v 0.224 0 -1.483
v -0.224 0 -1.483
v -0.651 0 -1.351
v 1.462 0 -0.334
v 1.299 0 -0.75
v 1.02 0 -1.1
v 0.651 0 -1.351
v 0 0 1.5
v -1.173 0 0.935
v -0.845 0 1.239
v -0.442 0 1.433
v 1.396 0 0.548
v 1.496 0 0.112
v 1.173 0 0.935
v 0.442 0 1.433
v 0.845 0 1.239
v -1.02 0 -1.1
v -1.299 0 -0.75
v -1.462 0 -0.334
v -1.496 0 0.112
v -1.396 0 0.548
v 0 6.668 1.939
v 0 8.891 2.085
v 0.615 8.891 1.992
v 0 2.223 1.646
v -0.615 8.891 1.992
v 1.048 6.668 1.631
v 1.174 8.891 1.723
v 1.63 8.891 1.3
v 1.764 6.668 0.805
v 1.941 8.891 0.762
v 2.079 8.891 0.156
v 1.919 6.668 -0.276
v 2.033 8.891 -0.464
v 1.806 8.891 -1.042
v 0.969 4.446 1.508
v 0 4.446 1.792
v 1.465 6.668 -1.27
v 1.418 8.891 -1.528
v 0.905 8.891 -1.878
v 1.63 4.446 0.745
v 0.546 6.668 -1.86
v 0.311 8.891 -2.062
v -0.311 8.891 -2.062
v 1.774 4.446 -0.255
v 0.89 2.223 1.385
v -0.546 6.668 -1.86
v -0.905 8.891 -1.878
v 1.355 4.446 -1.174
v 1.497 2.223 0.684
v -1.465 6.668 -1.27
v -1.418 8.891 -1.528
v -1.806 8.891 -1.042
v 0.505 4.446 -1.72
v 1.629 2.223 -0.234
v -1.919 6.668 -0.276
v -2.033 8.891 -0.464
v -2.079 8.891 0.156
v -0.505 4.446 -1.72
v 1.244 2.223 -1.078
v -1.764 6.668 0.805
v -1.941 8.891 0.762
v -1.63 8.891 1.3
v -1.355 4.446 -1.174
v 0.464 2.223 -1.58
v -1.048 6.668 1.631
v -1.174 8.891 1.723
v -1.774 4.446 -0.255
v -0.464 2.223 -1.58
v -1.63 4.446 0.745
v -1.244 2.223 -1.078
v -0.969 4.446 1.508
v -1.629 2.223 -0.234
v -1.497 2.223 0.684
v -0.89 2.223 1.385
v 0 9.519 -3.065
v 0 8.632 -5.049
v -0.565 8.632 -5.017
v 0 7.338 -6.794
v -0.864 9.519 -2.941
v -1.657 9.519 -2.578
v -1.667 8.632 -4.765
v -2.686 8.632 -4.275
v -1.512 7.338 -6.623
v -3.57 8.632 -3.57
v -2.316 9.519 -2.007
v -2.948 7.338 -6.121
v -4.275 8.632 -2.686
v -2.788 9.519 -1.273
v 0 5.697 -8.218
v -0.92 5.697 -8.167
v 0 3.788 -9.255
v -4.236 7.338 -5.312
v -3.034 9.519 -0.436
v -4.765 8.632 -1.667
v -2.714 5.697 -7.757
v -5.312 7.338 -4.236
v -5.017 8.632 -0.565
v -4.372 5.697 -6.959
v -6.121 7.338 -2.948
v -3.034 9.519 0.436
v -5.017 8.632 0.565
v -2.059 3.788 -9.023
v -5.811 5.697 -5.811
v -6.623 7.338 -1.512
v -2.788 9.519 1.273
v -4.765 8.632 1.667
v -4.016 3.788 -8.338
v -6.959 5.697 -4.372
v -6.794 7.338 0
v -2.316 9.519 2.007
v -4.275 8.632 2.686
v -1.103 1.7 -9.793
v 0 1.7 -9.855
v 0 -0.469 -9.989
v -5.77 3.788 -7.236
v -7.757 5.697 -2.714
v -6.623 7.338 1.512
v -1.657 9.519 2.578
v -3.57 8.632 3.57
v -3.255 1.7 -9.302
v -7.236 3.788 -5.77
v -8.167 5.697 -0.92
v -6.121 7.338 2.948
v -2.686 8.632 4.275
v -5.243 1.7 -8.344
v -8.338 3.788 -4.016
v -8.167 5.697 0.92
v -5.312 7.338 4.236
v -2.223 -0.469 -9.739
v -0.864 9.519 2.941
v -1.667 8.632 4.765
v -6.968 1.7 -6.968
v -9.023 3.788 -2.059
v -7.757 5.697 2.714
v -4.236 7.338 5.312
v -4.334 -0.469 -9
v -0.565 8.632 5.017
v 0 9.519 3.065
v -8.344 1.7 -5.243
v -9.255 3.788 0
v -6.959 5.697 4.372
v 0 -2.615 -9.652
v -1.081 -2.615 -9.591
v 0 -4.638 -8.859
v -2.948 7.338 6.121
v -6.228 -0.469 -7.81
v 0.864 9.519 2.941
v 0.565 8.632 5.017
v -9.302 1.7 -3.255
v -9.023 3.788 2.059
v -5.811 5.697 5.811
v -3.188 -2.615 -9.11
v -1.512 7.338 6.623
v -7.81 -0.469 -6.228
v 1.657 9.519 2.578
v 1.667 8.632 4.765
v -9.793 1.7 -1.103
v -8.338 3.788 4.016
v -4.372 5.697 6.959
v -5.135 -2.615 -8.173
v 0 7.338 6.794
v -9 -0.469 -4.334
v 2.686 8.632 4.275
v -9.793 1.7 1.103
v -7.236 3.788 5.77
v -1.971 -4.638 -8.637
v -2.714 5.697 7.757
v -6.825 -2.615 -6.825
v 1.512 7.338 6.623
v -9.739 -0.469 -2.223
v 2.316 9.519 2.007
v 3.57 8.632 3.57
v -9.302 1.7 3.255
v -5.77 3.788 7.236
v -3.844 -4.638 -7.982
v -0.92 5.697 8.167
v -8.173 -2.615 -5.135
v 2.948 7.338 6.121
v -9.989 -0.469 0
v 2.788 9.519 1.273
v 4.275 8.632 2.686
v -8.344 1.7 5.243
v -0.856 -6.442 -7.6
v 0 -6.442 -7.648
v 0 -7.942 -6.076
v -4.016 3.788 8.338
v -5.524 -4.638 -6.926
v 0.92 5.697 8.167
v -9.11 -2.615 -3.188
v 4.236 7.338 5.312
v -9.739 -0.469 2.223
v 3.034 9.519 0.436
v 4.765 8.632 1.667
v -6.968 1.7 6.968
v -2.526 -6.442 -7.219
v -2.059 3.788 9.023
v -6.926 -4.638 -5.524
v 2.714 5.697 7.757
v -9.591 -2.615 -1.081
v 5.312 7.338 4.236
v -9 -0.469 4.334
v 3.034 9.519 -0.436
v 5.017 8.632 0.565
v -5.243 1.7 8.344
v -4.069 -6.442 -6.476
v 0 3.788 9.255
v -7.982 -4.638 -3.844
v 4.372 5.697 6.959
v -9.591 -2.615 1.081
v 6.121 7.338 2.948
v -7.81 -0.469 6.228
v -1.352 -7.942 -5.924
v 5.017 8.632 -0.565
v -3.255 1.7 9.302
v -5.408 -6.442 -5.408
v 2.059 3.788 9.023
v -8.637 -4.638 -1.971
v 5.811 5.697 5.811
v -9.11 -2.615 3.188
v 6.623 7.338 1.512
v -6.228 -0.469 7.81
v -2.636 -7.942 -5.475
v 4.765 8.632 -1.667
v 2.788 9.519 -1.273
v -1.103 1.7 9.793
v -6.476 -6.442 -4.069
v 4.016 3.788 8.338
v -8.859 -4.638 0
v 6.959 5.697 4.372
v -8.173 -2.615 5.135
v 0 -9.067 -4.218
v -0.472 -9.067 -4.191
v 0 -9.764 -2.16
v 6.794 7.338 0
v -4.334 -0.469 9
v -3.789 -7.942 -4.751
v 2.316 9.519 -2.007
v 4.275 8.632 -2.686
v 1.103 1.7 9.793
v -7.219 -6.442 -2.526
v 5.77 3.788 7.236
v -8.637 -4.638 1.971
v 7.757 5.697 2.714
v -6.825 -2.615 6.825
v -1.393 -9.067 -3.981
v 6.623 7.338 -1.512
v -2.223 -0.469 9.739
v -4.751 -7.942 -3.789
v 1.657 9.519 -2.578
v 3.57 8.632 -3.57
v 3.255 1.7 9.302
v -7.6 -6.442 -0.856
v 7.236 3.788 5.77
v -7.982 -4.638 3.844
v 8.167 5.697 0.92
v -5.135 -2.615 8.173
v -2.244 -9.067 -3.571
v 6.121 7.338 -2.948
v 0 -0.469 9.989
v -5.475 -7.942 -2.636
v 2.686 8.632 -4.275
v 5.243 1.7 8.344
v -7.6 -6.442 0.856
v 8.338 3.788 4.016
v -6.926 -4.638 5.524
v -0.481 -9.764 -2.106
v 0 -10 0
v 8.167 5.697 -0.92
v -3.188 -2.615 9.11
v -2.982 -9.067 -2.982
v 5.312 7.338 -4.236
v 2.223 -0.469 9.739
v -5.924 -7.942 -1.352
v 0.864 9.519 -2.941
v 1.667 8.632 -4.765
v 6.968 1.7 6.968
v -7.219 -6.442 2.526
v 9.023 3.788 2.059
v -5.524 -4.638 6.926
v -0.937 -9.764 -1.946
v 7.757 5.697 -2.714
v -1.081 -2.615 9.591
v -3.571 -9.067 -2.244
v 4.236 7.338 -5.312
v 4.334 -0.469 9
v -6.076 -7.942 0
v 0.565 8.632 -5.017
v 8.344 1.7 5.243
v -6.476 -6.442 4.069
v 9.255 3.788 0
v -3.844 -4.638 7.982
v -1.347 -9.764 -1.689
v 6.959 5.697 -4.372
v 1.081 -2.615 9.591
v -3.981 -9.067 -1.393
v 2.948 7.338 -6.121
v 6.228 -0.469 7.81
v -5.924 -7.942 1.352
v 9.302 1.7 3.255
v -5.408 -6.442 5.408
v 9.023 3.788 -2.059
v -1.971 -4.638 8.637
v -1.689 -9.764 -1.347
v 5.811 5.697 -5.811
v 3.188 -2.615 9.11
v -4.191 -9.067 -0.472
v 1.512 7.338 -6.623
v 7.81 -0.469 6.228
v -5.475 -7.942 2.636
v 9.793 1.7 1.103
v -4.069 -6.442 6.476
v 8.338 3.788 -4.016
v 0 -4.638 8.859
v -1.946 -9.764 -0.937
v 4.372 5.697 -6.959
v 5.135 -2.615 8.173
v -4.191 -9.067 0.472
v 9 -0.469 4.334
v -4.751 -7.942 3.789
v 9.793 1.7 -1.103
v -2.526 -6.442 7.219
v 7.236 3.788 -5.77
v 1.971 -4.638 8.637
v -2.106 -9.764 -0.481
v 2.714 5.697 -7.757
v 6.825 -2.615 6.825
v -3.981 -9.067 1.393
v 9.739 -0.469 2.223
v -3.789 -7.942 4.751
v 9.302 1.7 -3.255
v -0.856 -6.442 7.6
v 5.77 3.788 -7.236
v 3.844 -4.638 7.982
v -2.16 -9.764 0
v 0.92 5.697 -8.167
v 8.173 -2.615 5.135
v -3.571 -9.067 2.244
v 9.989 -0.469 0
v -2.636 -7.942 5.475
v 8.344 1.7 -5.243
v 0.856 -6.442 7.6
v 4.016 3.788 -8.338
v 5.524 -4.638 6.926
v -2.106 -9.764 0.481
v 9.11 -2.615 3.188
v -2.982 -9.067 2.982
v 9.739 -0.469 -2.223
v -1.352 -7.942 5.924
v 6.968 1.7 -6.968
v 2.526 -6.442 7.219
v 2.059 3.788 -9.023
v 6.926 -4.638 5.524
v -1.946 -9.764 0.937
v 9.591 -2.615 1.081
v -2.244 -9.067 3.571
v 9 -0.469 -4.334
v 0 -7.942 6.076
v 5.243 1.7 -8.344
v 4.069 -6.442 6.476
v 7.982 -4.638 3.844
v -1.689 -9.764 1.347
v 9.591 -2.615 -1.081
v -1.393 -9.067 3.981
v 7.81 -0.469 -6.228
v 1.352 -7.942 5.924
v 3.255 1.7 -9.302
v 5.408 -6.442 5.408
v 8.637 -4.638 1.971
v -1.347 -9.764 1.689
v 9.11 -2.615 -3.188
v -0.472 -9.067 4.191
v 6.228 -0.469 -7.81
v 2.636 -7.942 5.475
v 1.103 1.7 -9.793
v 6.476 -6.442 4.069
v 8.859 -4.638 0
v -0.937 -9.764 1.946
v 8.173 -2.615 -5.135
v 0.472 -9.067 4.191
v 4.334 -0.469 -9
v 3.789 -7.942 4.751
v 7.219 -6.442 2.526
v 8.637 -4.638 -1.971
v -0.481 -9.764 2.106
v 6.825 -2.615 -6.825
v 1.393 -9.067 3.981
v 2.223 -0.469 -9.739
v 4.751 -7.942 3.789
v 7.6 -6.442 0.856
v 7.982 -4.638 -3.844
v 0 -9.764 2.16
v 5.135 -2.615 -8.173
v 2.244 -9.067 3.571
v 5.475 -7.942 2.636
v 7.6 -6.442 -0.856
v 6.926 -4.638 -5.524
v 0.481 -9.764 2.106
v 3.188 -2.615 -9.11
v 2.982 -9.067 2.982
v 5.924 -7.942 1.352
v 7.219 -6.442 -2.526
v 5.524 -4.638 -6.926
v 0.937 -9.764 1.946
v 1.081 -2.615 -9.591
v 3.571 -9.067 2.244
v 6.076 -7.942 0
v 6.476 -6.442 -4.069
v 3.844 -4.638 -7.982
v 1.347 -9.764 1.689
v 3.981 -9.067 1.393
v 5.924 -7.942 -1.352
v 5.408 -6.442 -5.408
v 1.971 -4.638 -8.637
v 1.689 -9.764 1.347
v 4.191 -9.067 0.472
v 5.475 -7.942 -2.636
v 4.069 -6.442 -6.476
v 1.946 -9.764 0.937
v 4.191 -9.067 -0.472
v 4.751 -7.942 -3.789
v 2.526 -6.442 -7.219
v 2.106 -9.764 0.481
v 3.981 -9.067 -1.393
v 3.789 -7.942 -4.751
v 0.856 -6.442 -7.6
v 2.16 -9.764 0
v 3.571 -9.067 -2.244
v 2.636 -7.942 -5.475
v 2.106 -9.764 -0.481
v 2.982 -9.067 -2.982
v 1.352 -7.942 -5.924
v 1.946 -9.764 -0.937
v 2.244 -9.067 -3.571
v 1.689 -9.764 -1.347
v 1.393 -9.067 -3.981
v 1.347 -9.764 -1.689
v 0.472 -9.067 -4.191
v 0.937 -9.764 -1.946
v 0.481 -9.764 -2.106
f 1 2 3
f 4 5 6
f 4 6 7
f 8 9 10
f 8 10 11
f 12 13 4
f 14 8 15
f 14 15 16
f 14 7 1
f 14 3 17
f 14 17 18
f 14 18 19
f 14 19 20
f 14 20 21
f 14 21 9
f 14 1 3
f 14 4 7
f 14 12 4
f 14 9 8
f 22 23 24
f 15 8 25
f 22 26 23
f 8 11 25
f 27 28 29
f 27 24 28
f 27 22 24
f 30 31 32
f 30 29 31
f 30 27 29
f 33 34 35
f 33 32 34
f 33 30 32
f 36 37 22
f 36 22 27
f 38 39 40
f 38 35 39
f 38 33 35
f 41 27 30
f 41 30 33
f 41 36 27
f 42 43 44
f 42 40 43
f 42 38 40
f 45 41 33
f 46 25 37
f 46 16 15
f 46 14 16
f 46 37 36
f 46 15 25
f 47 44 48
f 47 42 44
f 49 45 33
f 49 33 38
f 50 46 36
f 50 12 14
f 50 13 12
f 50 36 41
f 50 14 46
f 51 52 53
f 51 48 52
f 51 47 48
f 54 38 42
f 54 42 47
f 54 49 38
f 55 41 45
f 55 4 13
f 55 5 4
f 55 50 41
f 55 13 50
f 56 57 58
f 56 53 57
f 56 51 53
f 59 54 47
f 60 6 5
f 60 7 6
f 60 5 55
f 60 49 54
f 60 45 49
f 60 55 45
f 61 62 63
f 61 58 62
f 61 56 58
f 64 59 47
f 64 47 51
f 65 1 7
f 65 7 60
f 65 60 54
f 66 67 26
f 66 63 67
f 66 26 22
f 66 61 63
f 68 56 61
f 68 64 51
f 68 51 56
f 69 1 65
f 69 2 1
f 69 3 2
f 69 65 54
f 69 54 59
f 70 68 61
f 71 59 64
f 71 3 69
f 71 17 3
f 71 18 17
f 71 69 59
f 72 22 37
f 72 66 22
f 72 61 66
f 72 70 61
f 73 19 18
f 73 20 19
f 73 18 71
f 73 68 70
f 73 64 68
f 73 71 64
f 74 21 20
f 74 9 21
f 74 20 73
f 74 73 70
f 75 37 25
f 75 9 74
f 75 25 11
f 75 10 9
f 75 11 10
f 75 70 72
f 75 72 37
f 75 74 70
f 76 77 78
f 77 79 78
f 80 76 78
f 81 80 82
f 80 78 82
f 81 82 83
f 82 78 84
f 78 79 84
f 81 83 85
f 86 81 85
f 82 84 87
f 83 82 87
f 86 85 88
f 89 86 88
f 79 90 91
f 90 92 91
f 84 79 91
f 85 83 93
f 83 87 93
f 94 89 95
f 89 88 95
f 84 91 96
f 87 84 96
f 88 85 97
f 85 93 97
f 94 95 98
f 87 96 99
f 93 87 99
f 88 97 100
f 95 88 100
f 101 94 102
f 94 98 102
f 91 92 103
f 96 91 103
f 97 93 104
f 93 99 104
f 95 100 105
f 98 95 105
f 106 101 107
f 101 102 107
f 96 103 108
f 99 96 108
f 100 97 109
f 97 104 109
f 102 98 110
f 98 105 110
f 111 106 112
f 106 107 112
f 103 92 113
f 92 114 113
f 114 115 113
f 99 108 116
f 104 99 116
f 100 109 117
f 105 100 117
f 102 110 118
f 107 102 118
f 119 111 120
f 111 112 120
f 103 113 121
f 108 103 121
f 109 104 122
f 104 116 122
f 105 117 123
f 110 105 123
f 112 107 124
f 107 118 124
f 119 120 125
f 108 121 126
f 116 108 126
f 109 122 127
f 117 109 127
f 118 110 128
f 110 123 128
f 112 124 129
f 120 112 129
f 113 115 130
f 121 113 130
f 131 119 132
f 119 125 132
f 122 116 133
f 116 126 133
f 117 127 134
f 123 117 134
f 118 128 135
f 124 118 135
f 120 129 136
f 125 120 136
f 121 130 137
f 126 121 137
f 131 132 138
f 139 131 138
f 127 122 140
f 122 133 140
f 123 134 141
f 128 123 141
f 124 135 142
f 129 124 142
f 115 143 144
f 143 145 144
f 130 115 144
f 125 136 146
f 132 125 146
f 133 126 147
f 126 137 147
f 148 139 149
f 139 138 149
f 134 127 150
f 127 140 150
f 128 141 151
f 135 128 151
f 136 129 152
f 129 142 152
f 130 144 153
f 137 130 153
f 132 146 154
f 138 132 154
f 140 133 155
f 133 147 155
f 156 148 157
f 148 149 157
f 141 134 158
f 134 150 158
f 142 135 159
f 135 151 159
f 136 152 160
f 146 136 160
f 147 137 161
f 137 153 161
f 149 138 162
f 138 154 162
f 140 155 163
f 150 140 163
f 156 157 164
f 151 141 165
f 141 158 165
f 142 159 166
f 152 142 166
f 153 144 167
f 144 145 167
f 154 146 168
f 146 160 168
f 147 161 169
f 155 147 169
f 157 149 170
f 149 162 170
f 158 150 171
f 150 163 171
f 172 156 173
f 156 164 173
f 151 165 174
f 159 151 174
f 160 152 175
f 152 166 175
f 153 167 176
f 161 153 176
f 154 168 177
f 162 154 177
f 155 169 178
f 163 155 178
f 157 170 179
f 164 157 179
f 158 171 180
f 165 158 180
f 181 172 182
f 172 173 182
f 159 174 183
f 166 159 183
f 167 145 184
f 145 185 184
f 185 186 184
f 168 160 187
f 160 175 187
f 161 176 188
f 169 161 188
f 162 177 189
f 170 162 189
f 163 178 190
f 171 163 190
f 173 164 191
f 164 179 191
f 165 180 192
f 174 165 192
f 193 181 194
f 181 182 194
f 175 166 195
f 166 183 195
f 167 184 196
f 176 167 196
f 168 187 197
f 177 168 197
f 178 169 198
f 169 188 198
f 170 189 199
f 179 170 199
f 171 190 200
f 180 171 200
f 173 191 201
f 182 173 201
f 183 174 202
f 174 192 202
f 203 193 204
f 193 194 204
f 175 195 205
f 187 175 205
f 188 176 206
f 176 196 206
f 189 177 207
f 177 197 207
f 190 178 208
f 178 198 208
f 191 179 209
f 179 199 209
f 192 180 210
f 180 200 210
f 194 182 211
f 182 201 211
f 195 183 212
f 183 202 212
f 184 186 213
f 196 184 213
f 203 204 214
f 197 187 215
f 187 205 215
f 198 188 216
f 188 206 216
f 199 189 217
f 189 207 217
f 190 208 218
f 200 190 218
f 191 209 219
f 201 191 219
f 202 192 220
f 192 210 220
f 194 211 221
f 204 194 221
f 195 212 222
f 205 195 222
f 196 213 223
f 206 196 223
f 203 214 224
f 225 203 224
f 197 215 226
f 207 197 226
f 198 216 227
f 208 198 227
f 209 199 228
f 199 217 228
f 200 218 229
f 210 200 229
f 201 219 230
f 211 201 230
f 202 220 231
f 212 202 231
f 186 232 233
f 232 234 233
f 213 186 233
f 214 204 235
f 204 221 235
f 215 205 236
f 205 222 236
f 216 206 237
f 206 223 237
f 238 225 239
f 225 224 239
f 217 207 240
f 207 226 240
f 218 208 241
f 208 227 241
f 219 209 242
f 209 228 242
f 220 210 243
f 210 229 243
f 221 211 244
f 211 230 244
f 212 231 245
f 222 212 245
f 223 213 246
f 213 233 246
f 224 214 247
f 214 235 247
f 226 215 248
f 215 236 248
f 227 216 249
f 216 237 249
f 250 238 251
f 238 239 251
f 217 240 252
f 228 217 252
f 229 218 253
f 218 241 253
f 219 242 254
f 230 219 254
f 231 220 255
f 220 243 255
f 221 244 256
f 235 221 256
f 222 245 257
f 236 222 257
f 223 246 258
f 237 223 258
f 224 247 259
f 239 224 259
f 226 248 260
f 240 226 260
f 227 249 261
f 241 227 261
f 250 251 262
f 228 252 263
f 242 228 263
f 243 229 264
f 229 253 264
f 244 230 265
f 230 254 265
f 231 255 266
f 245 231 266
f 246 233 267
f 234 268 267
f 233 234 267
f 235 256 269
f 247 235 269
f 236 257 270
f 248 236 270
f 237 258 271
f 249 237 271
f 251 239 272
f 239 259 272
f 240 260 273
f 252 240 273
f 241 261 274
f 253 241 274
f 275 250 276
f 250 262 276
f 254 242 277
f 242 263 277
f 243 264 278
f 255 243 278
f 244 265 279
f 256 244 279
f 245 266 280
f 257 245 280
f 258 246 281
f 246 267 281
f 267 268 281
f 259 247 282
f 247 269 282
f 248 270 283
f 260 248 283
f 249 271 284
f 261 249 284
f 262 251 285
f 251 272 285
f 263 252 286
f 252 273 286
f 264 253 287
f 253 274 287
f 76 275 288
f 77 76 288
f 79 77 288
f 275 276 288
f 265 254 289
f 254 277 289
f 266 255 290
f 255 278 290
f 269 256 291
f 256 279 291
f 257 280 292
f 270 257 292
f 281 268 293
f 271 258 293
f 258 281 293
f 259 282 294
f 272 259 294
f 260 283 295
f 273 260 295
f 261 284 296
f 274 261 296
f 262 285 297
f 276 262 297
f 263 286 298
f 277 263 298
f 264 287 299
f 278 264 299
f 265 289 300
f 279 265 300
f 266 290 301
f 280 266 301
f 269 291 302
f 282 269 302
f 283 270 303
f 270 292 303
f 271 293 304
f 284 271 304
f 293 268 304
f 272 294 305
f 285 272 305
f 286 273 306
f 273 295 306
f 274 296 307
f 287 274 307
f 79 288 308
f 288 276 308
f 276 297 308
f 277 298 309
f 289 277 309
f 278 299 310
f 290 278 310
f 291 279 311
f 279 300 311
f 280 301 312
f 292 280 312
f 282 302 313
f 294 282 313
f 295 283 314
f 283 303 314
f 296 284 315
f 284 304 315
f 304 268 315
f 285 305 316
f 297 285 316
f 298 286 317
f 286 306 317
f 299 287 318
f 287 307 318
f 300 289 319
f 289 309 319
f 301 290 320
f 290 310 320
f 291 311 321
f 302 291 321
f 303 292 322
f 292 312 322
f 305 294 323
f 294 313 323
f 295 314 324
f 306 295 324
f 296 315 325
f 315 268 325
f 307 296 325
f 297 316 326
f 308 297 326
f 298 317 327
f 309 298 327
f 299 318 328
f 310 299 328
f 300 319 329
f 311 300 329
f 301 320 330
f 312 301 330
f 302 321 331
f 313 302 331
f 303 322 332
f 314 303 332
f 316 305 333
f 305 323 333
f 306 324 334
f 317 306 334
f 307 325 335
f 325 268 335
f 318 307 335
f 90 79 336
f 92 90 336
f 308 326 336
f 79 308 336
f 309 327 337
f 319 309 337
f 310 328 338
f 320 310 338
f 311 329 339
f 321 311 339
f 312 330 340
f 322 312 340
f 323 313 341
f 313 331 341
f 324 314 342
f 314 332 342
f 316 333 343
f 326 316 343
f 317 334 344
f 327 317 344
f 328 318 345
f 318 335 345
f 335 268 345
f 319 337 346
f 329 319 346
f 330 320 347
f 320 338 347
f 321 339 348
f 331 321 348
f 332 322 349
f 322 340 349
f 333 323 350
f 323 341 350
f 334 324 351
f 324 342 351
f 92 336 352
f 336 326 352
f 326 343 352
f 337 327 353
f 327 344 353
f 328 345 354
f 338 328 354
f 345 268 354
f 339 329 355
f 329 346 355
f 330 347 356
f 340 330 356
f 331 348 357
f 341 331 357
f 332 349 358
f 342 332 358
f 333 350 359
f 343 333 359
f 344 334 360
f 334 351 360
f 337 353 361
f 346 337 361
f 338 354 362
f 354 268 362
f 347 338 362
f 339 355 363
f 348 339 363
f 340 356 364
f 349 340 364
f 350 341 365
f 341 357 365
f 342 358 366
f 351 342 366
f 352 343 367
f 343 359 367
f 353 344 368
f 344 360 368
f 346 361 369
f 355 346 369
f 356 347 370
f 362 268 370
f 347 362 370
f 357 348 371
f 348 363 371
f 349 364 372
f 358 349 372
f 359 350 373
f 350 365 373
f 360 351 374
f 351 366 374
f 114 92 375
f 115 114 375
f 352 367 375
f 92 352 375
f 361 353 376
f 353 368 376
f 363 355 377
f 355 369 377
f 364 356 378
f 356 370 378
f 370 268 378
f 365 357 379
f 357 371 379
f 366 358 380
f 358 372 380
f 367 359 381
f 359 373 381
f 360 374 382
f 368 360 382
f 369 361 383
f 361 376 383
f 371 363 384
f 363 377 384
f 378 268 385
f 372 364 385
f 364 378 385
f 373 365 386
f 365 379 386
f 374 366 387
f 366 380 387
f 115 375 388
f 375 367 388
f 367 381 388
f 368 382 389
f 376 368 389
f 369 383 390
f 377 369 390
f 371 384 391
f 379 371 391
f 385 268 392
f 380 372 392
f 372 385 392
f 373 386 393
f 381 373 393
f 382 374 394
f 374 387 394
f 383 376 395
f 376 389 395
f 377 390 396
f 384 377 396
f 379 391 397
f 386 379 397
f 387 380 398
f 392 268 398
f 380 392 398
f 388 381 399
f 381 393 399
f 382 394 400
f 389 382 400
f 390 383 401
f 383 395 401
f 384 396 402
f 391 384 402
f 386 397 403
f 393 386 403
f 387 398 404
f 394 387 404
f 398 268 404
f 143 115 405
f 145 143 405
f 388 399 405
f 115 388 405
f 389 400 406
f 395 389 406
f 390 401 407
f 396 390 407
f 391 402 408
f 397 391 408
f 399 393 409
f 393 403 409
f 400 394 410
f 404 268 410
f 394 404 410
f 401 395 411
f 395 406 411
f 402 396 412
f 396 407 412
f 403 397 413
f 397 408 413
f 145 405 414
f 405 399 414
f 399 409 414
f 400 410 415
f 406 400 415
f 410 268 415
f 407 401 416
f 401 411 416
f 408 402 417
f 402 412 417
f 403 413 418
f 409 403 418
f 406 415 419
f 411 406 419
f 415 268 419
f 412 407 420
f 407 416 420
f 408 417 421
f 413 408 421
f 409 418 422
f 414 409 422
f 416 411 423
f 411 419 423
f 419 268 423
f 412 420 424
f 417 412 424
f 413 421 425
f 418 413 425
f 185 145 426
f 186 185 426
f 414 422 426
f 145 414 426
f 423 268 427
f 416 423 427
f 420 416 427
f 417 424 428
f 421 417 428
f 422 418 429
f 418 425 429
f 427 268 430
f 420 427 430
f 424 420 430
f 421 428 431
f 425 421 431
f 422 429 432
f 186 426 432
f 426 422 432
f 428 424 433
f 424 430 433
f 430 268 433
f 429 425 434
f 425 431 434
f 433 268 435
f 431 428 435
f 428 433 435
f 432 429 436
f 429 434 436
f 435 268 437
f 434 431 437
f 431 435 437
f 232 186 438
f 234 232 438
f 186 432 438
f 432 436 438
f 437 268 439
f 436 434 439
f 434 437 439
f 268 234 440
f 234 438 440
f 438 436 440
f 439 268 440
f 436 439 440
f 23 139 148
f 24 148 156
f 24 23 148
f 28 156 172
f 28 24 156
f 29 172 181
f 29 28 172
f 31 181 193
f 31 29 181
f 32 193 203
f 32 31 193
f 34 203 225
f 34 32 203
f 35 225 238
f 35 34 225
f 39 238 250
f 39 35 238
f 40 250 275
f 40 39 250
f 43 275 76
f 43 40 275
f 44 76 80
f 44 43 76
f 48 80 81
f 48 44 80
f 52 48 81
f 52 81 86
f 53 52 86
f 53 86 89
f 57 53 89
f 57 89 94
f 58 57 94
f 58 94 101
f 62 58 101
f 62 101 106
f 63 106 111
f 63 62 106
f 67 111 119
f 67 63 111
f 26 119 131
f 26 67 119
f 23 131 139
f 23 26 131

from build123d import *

# Parameters (mm, degrees)
CHAMFER1_SIZE = 0.878417015


with BuildPart() as part:
    # Sketch1 → Revolve1 (revolve)
    with BuildSketch(Plane(origin=(0, 0, 0), x_dir=(0, 0, -1), z_dir=(1, 0, 0))):
        with BuildLine():
            Line((0, 0), (0, 10))
            ThreePointArc((0, 10), (10, 0), (0, -10))
            Line((0, -10), (0, 0))
        make_face()
    revolve(axis=Axis((0, 0, 0), (0, 1, 0)))

    # Sketch2 → Cut-Revolve1 (revolve, cut)
    with BuildSketch(Plane(origin=(0, 0, 0), x_dir=(0, 0, -1), z_dir=(1, 0, 0)), mode=Mode.PRIVATE) as cut_revolve1_sk:
        Polygon((0, 0), (0, 10.64), (2.2, 10.64), (1.5, 0), align=None)
    revolve(cut_revolve1_sk.sketch.rotate(Axis((0, 0, 0), (0, 1, 0)), 180), axis=Axis((0, 0, 0), (0, 1, 0)), mode=Mode.SUBTRACT)

    # Chamfer1
    # the kernel refuses this chamfer: 1, 0.878417015 mm, written as the material it takes off along each edge
    with BuildSketch(Plane(origin=(0, 9.767763137, 0), x_dir=(0, 0, 1), z_dir=(-1, 0, 0))) as chamfer1_piece_1:
        with BuildLine():
            Line((3.065028643, -0.249065777), (2.142615996 - CHAMFER1_SIZE * 0.0656475573893, -CHAMFER1_SIZE * 0.997842872317))
            Line((2.142615996 - CHAMFER1_SIZE * 0.0656475573893, -CHAMFER1_SIZE * 0.997842872317), (2.142615996, 0))
            ThreePointArc((2.142615996, 0), (2.619777215, -0.117023924), (3.065028643, -0.249065777))
        make_face()
    revolve(axis=Axis((0, 9.767763137, 0), (0, 1, 0)), revolution_arc=180, mode=Mode.SUBTRACT)
    with BuildSketch(Plane(origin=(0, 9.767763137, 0), x_dir=(0, 0, -1), z_dir=(1, 0, 0))) as chamfer1_piece_2:
        with BuildLine():
            Line((3.065028643, -0.249065777), (2.142615996 - CHAMFER1_SIZE * 0.0656475573893, -CHAMFER1_SIZE * 0.997842872317))
            Line((2.142615996 - CHAMFER1_SIZE * 0.0656475573893, -CHAMFER1_SIZE * 0.997842872317), (2.142615996, 0))
            ThreePointArc((2.142615996, 0), (2.619777215, -0.117023924), (3.065028643, -0.249065777))
        make_face()
    revolve(axis=Axis((0, 9.767763137, 0), (0, 1, 0)), revolution_arc=180, mode=Mode.SUBTRACT)


solid = part.part
